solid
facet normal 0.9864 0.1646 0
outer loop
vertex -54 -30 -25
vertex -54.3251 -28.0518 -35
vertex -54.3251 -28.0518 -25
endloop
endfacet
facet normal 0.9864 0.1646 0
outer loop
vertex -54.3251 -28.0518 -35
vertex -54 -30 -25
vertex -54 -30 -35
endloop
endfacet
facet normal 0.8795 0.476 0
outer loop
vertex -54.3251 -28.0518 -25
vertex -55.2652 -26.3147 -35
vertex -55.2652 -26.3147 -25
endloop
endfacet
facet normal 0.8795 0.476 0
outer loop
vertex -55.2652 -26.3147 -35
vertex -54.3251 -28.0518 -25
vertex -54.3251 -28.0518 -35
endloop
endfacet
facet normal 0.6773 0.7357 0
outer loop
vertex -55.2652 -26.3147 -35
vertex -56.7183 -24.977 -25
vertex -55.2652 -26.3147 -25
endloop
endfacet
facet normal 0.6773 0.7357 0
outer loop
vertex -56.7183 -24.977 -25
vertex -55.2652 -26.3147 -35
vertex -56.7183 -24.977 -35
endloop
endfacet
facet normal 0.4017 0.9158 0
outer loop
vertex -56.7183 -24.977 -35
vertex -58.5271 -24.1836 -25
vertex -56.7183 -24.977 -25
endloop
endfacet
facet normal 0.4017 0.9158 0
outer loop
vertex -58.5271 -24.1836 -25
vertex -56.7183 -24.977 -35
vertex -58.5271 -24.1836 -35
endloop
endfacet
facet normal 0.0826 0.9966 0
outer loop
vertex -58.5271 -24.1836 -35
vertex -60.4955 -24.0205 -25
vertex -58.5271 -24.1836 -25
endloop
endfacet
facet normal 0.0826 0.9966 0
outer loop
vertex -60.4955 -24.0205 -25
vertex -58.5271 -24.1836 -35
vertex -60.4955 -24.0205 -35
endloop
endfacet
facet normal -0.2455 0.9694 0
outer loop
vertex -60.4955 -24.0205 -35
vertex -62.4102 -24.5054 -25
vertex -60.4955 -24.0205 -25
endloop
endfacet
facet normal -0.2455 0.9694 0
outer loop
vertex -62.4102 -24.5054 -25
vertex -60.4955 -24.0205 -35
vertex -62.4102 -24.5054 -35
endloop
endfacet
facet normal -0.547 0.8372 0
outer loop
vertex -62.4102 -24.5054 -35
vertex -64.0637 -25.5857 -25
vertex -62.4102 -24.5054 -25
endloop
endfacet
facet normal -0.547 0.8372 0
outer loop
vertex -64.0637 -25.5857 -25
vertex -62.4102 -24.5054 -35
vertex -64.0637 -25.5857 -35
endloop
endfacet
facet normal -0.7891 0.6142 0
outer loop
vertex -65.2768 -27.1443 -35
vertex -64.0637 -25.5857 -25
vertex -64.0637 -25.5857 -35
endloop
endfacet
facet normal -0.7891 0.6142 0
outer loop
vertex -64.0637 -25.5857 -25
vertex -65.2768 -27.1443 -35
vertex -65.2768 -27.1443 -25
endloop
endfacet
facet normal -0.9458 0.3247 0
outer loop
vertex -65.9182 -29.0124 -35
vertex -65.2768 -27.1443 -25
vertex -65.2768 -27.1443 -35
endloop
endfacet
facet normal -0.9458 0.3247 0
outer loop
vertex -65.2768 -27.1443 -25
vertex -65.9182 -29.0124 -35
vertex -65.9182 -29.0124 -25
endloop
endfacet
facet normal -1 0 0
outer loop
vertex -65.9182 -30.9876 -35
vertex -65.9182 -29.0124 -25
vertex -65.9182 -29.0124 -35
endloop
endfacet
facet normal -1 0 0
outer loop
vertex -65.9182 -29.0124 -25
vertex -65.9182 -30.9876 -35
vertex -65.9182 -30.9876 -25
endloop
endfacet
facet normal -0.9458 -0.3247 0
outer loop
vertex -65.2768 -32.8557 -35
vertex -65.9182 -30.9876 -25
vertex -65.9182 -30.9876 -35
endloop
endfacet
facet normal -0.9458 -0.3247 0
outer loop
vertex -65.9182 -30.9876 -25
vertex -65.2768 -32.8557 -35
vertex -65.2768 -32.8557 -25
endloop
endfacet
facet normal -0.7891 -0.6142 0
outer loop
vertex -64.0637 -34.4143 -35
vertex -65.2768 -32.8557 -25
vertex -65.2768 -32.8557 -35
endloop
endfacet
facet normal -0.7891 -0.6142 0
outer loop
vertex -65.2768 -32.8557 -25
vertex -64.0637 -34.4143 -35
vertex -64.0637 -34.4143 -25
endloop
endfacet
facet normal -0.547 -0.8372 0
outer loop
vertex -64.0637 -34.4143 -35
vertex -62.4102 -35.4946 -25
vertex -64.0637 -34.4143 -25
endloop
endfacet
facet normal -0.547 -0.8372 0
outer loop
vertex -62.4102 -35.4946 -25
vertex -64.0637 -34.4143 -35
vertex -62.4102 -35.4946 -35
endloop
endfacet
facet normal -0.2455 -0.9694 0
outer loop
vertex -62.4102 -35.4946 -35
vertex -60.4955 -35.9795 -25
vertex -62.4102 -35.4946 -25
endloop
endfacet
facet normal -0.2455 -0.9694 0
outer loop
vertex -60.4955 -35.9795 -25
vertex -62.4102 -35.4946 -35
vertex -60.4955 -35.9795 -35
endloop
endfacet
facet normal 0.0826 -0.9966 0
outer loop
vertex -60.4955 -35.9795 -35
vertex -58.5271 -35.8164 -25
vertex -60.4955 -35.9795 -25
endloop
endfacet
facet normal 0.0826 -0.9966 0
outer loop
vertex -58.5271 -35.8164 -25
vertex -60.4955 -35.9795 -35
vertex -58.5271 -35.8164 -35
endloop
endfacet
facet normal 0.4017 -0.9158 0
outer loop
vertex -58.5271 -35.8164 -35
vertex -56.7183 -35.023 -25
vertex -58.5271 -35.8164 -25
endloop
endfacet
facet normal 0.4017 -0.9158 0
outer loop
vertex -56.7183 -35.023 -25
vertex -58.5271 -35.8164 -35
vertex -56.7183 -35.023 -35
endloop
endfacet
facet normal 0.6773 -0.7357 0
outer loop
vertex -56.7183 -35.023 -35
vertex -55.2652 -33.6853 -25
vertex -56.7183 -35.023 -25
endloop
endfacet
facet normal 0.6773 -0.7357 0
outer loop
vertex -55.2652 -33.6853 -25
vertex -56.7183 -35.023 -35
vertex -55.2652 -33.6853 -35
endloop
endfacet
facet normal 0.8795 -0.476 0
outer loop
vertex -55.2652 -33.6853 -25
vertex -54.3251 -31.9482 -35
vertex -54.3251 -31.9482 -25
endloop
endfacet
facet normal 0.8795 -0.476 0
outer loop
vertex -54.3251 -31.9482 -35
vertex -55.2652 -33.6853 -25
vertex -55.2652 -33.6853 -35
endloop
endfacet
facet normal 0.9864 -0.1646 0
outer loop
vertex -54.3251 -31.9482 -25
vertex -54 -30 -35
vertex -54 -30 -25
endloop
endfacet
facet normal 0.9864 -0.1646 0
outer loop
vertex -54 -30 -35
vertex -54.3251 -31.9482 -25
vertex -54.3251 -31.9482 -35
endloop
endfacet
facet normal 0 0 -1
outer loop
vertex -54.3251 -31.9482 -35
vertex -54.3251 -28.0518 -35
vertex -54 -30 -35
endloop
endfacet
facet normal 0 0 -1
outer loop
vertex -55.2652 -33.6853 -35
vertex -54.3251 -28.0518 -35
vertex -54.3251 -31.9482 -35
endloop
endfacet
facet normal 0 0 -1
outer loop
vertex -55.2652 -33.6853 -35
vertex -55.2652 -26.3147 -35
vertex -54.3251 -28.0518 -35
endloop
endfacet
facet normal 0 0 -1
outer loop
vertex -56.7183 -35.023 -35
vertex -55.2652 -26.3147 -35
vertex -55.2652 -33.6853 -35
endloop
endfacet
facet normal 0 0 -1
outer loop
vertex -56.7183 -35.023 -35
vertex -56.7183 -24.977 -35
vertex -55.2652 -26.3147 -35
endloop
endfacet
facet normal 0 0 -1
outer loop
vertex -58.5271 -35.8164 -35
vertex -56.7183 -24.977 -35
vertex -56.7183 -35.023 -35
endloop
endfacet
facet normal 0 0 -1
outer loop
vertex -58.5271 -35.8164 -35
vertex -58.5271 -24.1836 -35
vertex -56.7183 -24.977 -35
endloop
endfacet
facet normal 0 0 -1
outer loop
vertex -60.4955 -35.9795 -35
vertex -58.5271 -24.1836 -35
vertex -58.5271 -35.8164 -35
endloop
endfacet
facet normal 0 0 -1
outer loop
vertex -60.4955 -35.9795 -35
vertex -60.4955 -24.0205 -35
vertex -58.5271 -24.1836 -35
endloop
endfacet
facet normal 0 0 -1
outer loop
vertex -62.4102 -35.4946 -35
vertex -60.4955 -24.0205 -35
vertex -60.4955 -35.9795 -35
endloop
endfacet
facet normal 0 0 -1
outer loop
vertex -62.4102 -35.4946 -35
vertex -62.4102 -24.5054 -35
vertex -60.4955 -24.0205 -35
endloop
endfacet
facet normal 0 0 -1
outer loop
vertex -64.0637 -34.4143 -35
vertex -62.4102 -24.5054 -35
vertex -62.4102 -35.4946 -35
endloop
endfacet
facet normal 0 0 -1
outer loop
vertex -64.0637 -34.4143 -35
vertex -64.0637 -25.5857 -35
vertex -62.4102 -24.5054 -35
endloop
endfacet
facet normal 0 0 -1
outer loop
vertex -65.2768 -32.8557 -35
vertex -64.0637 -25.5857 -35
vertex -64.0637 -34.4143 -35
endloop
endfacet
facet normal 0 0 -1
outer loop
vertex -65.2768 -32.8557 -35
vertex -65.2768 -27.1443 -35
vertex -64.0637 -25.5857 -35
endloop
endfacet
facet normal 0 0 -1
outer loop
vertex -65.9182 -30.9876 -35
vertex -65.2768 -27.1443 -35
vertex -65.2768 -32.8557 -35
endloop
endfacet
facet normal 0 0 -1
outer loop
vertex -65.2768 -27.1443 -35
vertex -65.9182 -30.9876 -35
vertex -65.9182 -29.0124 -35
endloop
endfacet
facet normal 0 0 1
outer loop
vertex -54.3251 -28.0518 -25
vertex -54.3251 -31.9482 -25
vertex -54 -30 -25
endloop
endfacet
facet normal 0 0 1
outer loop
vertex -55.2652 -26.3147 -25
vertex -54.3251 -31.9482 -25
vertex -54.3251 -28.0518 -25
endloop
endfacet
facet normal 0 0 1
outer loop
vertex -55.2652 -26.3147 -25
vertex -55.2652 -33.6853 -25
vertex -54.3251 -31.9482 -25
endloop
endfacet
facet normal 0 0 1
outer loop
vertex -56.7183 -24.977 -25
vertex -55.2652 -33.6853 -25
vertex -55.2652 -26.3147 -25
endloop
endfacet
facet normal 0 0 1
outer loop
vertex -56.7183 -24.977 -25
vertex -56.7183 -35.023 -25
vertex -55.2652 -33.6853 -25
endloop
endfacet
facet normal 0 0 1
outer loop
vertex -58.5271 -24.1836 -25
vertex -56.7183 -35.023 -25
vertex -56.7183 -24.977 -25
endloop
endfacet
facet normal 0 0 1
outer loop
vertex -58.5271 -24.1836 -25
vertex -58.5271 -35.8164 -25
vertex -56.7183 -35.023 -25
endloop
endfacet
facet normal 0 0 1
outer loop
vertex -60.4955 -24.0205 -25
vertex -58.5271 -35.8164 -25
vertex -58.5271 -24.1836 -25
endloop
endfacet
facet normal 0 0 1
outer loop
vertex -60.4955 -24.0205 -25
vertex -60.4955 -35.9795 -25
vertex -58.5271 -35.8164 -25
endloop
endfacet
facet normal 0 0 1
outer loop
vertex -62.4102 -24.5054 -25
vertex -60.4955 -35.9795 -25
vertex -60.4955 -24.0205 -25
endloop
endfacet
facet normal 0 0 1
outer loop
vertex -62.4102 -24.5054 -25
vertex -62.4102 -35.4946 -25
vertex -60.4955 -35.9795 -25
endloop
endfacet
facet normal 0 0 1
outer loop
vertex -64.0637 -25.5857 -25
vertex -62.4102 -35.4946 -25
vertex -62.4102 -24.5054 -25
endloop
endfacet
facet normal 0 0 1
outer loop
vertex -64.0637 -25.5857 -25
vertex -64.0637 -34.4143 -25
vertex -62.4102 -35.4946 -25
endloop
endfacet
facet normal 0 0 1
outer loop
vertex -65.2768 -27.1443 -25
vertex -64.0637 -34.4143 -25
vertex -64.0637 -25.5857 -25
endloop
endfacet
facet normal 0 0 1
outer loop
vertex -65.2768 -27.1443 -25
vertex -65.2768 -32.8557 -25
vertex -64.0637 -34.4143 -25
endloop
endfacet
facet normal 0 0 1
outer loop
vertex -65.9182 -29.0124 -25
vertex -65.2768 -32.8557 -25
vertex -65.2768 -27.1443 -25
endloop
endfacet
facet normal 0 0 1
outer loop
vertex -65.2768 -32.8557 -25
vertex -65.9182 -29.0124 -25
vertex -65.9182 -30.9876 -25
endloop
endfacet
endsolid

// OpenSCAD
// Generated by generate_scads.py
translate([-30,-30,-20]) {
  translate([-30,0,-10]) {
    cylinder(h=10, r=6, center=true);
  }
}
